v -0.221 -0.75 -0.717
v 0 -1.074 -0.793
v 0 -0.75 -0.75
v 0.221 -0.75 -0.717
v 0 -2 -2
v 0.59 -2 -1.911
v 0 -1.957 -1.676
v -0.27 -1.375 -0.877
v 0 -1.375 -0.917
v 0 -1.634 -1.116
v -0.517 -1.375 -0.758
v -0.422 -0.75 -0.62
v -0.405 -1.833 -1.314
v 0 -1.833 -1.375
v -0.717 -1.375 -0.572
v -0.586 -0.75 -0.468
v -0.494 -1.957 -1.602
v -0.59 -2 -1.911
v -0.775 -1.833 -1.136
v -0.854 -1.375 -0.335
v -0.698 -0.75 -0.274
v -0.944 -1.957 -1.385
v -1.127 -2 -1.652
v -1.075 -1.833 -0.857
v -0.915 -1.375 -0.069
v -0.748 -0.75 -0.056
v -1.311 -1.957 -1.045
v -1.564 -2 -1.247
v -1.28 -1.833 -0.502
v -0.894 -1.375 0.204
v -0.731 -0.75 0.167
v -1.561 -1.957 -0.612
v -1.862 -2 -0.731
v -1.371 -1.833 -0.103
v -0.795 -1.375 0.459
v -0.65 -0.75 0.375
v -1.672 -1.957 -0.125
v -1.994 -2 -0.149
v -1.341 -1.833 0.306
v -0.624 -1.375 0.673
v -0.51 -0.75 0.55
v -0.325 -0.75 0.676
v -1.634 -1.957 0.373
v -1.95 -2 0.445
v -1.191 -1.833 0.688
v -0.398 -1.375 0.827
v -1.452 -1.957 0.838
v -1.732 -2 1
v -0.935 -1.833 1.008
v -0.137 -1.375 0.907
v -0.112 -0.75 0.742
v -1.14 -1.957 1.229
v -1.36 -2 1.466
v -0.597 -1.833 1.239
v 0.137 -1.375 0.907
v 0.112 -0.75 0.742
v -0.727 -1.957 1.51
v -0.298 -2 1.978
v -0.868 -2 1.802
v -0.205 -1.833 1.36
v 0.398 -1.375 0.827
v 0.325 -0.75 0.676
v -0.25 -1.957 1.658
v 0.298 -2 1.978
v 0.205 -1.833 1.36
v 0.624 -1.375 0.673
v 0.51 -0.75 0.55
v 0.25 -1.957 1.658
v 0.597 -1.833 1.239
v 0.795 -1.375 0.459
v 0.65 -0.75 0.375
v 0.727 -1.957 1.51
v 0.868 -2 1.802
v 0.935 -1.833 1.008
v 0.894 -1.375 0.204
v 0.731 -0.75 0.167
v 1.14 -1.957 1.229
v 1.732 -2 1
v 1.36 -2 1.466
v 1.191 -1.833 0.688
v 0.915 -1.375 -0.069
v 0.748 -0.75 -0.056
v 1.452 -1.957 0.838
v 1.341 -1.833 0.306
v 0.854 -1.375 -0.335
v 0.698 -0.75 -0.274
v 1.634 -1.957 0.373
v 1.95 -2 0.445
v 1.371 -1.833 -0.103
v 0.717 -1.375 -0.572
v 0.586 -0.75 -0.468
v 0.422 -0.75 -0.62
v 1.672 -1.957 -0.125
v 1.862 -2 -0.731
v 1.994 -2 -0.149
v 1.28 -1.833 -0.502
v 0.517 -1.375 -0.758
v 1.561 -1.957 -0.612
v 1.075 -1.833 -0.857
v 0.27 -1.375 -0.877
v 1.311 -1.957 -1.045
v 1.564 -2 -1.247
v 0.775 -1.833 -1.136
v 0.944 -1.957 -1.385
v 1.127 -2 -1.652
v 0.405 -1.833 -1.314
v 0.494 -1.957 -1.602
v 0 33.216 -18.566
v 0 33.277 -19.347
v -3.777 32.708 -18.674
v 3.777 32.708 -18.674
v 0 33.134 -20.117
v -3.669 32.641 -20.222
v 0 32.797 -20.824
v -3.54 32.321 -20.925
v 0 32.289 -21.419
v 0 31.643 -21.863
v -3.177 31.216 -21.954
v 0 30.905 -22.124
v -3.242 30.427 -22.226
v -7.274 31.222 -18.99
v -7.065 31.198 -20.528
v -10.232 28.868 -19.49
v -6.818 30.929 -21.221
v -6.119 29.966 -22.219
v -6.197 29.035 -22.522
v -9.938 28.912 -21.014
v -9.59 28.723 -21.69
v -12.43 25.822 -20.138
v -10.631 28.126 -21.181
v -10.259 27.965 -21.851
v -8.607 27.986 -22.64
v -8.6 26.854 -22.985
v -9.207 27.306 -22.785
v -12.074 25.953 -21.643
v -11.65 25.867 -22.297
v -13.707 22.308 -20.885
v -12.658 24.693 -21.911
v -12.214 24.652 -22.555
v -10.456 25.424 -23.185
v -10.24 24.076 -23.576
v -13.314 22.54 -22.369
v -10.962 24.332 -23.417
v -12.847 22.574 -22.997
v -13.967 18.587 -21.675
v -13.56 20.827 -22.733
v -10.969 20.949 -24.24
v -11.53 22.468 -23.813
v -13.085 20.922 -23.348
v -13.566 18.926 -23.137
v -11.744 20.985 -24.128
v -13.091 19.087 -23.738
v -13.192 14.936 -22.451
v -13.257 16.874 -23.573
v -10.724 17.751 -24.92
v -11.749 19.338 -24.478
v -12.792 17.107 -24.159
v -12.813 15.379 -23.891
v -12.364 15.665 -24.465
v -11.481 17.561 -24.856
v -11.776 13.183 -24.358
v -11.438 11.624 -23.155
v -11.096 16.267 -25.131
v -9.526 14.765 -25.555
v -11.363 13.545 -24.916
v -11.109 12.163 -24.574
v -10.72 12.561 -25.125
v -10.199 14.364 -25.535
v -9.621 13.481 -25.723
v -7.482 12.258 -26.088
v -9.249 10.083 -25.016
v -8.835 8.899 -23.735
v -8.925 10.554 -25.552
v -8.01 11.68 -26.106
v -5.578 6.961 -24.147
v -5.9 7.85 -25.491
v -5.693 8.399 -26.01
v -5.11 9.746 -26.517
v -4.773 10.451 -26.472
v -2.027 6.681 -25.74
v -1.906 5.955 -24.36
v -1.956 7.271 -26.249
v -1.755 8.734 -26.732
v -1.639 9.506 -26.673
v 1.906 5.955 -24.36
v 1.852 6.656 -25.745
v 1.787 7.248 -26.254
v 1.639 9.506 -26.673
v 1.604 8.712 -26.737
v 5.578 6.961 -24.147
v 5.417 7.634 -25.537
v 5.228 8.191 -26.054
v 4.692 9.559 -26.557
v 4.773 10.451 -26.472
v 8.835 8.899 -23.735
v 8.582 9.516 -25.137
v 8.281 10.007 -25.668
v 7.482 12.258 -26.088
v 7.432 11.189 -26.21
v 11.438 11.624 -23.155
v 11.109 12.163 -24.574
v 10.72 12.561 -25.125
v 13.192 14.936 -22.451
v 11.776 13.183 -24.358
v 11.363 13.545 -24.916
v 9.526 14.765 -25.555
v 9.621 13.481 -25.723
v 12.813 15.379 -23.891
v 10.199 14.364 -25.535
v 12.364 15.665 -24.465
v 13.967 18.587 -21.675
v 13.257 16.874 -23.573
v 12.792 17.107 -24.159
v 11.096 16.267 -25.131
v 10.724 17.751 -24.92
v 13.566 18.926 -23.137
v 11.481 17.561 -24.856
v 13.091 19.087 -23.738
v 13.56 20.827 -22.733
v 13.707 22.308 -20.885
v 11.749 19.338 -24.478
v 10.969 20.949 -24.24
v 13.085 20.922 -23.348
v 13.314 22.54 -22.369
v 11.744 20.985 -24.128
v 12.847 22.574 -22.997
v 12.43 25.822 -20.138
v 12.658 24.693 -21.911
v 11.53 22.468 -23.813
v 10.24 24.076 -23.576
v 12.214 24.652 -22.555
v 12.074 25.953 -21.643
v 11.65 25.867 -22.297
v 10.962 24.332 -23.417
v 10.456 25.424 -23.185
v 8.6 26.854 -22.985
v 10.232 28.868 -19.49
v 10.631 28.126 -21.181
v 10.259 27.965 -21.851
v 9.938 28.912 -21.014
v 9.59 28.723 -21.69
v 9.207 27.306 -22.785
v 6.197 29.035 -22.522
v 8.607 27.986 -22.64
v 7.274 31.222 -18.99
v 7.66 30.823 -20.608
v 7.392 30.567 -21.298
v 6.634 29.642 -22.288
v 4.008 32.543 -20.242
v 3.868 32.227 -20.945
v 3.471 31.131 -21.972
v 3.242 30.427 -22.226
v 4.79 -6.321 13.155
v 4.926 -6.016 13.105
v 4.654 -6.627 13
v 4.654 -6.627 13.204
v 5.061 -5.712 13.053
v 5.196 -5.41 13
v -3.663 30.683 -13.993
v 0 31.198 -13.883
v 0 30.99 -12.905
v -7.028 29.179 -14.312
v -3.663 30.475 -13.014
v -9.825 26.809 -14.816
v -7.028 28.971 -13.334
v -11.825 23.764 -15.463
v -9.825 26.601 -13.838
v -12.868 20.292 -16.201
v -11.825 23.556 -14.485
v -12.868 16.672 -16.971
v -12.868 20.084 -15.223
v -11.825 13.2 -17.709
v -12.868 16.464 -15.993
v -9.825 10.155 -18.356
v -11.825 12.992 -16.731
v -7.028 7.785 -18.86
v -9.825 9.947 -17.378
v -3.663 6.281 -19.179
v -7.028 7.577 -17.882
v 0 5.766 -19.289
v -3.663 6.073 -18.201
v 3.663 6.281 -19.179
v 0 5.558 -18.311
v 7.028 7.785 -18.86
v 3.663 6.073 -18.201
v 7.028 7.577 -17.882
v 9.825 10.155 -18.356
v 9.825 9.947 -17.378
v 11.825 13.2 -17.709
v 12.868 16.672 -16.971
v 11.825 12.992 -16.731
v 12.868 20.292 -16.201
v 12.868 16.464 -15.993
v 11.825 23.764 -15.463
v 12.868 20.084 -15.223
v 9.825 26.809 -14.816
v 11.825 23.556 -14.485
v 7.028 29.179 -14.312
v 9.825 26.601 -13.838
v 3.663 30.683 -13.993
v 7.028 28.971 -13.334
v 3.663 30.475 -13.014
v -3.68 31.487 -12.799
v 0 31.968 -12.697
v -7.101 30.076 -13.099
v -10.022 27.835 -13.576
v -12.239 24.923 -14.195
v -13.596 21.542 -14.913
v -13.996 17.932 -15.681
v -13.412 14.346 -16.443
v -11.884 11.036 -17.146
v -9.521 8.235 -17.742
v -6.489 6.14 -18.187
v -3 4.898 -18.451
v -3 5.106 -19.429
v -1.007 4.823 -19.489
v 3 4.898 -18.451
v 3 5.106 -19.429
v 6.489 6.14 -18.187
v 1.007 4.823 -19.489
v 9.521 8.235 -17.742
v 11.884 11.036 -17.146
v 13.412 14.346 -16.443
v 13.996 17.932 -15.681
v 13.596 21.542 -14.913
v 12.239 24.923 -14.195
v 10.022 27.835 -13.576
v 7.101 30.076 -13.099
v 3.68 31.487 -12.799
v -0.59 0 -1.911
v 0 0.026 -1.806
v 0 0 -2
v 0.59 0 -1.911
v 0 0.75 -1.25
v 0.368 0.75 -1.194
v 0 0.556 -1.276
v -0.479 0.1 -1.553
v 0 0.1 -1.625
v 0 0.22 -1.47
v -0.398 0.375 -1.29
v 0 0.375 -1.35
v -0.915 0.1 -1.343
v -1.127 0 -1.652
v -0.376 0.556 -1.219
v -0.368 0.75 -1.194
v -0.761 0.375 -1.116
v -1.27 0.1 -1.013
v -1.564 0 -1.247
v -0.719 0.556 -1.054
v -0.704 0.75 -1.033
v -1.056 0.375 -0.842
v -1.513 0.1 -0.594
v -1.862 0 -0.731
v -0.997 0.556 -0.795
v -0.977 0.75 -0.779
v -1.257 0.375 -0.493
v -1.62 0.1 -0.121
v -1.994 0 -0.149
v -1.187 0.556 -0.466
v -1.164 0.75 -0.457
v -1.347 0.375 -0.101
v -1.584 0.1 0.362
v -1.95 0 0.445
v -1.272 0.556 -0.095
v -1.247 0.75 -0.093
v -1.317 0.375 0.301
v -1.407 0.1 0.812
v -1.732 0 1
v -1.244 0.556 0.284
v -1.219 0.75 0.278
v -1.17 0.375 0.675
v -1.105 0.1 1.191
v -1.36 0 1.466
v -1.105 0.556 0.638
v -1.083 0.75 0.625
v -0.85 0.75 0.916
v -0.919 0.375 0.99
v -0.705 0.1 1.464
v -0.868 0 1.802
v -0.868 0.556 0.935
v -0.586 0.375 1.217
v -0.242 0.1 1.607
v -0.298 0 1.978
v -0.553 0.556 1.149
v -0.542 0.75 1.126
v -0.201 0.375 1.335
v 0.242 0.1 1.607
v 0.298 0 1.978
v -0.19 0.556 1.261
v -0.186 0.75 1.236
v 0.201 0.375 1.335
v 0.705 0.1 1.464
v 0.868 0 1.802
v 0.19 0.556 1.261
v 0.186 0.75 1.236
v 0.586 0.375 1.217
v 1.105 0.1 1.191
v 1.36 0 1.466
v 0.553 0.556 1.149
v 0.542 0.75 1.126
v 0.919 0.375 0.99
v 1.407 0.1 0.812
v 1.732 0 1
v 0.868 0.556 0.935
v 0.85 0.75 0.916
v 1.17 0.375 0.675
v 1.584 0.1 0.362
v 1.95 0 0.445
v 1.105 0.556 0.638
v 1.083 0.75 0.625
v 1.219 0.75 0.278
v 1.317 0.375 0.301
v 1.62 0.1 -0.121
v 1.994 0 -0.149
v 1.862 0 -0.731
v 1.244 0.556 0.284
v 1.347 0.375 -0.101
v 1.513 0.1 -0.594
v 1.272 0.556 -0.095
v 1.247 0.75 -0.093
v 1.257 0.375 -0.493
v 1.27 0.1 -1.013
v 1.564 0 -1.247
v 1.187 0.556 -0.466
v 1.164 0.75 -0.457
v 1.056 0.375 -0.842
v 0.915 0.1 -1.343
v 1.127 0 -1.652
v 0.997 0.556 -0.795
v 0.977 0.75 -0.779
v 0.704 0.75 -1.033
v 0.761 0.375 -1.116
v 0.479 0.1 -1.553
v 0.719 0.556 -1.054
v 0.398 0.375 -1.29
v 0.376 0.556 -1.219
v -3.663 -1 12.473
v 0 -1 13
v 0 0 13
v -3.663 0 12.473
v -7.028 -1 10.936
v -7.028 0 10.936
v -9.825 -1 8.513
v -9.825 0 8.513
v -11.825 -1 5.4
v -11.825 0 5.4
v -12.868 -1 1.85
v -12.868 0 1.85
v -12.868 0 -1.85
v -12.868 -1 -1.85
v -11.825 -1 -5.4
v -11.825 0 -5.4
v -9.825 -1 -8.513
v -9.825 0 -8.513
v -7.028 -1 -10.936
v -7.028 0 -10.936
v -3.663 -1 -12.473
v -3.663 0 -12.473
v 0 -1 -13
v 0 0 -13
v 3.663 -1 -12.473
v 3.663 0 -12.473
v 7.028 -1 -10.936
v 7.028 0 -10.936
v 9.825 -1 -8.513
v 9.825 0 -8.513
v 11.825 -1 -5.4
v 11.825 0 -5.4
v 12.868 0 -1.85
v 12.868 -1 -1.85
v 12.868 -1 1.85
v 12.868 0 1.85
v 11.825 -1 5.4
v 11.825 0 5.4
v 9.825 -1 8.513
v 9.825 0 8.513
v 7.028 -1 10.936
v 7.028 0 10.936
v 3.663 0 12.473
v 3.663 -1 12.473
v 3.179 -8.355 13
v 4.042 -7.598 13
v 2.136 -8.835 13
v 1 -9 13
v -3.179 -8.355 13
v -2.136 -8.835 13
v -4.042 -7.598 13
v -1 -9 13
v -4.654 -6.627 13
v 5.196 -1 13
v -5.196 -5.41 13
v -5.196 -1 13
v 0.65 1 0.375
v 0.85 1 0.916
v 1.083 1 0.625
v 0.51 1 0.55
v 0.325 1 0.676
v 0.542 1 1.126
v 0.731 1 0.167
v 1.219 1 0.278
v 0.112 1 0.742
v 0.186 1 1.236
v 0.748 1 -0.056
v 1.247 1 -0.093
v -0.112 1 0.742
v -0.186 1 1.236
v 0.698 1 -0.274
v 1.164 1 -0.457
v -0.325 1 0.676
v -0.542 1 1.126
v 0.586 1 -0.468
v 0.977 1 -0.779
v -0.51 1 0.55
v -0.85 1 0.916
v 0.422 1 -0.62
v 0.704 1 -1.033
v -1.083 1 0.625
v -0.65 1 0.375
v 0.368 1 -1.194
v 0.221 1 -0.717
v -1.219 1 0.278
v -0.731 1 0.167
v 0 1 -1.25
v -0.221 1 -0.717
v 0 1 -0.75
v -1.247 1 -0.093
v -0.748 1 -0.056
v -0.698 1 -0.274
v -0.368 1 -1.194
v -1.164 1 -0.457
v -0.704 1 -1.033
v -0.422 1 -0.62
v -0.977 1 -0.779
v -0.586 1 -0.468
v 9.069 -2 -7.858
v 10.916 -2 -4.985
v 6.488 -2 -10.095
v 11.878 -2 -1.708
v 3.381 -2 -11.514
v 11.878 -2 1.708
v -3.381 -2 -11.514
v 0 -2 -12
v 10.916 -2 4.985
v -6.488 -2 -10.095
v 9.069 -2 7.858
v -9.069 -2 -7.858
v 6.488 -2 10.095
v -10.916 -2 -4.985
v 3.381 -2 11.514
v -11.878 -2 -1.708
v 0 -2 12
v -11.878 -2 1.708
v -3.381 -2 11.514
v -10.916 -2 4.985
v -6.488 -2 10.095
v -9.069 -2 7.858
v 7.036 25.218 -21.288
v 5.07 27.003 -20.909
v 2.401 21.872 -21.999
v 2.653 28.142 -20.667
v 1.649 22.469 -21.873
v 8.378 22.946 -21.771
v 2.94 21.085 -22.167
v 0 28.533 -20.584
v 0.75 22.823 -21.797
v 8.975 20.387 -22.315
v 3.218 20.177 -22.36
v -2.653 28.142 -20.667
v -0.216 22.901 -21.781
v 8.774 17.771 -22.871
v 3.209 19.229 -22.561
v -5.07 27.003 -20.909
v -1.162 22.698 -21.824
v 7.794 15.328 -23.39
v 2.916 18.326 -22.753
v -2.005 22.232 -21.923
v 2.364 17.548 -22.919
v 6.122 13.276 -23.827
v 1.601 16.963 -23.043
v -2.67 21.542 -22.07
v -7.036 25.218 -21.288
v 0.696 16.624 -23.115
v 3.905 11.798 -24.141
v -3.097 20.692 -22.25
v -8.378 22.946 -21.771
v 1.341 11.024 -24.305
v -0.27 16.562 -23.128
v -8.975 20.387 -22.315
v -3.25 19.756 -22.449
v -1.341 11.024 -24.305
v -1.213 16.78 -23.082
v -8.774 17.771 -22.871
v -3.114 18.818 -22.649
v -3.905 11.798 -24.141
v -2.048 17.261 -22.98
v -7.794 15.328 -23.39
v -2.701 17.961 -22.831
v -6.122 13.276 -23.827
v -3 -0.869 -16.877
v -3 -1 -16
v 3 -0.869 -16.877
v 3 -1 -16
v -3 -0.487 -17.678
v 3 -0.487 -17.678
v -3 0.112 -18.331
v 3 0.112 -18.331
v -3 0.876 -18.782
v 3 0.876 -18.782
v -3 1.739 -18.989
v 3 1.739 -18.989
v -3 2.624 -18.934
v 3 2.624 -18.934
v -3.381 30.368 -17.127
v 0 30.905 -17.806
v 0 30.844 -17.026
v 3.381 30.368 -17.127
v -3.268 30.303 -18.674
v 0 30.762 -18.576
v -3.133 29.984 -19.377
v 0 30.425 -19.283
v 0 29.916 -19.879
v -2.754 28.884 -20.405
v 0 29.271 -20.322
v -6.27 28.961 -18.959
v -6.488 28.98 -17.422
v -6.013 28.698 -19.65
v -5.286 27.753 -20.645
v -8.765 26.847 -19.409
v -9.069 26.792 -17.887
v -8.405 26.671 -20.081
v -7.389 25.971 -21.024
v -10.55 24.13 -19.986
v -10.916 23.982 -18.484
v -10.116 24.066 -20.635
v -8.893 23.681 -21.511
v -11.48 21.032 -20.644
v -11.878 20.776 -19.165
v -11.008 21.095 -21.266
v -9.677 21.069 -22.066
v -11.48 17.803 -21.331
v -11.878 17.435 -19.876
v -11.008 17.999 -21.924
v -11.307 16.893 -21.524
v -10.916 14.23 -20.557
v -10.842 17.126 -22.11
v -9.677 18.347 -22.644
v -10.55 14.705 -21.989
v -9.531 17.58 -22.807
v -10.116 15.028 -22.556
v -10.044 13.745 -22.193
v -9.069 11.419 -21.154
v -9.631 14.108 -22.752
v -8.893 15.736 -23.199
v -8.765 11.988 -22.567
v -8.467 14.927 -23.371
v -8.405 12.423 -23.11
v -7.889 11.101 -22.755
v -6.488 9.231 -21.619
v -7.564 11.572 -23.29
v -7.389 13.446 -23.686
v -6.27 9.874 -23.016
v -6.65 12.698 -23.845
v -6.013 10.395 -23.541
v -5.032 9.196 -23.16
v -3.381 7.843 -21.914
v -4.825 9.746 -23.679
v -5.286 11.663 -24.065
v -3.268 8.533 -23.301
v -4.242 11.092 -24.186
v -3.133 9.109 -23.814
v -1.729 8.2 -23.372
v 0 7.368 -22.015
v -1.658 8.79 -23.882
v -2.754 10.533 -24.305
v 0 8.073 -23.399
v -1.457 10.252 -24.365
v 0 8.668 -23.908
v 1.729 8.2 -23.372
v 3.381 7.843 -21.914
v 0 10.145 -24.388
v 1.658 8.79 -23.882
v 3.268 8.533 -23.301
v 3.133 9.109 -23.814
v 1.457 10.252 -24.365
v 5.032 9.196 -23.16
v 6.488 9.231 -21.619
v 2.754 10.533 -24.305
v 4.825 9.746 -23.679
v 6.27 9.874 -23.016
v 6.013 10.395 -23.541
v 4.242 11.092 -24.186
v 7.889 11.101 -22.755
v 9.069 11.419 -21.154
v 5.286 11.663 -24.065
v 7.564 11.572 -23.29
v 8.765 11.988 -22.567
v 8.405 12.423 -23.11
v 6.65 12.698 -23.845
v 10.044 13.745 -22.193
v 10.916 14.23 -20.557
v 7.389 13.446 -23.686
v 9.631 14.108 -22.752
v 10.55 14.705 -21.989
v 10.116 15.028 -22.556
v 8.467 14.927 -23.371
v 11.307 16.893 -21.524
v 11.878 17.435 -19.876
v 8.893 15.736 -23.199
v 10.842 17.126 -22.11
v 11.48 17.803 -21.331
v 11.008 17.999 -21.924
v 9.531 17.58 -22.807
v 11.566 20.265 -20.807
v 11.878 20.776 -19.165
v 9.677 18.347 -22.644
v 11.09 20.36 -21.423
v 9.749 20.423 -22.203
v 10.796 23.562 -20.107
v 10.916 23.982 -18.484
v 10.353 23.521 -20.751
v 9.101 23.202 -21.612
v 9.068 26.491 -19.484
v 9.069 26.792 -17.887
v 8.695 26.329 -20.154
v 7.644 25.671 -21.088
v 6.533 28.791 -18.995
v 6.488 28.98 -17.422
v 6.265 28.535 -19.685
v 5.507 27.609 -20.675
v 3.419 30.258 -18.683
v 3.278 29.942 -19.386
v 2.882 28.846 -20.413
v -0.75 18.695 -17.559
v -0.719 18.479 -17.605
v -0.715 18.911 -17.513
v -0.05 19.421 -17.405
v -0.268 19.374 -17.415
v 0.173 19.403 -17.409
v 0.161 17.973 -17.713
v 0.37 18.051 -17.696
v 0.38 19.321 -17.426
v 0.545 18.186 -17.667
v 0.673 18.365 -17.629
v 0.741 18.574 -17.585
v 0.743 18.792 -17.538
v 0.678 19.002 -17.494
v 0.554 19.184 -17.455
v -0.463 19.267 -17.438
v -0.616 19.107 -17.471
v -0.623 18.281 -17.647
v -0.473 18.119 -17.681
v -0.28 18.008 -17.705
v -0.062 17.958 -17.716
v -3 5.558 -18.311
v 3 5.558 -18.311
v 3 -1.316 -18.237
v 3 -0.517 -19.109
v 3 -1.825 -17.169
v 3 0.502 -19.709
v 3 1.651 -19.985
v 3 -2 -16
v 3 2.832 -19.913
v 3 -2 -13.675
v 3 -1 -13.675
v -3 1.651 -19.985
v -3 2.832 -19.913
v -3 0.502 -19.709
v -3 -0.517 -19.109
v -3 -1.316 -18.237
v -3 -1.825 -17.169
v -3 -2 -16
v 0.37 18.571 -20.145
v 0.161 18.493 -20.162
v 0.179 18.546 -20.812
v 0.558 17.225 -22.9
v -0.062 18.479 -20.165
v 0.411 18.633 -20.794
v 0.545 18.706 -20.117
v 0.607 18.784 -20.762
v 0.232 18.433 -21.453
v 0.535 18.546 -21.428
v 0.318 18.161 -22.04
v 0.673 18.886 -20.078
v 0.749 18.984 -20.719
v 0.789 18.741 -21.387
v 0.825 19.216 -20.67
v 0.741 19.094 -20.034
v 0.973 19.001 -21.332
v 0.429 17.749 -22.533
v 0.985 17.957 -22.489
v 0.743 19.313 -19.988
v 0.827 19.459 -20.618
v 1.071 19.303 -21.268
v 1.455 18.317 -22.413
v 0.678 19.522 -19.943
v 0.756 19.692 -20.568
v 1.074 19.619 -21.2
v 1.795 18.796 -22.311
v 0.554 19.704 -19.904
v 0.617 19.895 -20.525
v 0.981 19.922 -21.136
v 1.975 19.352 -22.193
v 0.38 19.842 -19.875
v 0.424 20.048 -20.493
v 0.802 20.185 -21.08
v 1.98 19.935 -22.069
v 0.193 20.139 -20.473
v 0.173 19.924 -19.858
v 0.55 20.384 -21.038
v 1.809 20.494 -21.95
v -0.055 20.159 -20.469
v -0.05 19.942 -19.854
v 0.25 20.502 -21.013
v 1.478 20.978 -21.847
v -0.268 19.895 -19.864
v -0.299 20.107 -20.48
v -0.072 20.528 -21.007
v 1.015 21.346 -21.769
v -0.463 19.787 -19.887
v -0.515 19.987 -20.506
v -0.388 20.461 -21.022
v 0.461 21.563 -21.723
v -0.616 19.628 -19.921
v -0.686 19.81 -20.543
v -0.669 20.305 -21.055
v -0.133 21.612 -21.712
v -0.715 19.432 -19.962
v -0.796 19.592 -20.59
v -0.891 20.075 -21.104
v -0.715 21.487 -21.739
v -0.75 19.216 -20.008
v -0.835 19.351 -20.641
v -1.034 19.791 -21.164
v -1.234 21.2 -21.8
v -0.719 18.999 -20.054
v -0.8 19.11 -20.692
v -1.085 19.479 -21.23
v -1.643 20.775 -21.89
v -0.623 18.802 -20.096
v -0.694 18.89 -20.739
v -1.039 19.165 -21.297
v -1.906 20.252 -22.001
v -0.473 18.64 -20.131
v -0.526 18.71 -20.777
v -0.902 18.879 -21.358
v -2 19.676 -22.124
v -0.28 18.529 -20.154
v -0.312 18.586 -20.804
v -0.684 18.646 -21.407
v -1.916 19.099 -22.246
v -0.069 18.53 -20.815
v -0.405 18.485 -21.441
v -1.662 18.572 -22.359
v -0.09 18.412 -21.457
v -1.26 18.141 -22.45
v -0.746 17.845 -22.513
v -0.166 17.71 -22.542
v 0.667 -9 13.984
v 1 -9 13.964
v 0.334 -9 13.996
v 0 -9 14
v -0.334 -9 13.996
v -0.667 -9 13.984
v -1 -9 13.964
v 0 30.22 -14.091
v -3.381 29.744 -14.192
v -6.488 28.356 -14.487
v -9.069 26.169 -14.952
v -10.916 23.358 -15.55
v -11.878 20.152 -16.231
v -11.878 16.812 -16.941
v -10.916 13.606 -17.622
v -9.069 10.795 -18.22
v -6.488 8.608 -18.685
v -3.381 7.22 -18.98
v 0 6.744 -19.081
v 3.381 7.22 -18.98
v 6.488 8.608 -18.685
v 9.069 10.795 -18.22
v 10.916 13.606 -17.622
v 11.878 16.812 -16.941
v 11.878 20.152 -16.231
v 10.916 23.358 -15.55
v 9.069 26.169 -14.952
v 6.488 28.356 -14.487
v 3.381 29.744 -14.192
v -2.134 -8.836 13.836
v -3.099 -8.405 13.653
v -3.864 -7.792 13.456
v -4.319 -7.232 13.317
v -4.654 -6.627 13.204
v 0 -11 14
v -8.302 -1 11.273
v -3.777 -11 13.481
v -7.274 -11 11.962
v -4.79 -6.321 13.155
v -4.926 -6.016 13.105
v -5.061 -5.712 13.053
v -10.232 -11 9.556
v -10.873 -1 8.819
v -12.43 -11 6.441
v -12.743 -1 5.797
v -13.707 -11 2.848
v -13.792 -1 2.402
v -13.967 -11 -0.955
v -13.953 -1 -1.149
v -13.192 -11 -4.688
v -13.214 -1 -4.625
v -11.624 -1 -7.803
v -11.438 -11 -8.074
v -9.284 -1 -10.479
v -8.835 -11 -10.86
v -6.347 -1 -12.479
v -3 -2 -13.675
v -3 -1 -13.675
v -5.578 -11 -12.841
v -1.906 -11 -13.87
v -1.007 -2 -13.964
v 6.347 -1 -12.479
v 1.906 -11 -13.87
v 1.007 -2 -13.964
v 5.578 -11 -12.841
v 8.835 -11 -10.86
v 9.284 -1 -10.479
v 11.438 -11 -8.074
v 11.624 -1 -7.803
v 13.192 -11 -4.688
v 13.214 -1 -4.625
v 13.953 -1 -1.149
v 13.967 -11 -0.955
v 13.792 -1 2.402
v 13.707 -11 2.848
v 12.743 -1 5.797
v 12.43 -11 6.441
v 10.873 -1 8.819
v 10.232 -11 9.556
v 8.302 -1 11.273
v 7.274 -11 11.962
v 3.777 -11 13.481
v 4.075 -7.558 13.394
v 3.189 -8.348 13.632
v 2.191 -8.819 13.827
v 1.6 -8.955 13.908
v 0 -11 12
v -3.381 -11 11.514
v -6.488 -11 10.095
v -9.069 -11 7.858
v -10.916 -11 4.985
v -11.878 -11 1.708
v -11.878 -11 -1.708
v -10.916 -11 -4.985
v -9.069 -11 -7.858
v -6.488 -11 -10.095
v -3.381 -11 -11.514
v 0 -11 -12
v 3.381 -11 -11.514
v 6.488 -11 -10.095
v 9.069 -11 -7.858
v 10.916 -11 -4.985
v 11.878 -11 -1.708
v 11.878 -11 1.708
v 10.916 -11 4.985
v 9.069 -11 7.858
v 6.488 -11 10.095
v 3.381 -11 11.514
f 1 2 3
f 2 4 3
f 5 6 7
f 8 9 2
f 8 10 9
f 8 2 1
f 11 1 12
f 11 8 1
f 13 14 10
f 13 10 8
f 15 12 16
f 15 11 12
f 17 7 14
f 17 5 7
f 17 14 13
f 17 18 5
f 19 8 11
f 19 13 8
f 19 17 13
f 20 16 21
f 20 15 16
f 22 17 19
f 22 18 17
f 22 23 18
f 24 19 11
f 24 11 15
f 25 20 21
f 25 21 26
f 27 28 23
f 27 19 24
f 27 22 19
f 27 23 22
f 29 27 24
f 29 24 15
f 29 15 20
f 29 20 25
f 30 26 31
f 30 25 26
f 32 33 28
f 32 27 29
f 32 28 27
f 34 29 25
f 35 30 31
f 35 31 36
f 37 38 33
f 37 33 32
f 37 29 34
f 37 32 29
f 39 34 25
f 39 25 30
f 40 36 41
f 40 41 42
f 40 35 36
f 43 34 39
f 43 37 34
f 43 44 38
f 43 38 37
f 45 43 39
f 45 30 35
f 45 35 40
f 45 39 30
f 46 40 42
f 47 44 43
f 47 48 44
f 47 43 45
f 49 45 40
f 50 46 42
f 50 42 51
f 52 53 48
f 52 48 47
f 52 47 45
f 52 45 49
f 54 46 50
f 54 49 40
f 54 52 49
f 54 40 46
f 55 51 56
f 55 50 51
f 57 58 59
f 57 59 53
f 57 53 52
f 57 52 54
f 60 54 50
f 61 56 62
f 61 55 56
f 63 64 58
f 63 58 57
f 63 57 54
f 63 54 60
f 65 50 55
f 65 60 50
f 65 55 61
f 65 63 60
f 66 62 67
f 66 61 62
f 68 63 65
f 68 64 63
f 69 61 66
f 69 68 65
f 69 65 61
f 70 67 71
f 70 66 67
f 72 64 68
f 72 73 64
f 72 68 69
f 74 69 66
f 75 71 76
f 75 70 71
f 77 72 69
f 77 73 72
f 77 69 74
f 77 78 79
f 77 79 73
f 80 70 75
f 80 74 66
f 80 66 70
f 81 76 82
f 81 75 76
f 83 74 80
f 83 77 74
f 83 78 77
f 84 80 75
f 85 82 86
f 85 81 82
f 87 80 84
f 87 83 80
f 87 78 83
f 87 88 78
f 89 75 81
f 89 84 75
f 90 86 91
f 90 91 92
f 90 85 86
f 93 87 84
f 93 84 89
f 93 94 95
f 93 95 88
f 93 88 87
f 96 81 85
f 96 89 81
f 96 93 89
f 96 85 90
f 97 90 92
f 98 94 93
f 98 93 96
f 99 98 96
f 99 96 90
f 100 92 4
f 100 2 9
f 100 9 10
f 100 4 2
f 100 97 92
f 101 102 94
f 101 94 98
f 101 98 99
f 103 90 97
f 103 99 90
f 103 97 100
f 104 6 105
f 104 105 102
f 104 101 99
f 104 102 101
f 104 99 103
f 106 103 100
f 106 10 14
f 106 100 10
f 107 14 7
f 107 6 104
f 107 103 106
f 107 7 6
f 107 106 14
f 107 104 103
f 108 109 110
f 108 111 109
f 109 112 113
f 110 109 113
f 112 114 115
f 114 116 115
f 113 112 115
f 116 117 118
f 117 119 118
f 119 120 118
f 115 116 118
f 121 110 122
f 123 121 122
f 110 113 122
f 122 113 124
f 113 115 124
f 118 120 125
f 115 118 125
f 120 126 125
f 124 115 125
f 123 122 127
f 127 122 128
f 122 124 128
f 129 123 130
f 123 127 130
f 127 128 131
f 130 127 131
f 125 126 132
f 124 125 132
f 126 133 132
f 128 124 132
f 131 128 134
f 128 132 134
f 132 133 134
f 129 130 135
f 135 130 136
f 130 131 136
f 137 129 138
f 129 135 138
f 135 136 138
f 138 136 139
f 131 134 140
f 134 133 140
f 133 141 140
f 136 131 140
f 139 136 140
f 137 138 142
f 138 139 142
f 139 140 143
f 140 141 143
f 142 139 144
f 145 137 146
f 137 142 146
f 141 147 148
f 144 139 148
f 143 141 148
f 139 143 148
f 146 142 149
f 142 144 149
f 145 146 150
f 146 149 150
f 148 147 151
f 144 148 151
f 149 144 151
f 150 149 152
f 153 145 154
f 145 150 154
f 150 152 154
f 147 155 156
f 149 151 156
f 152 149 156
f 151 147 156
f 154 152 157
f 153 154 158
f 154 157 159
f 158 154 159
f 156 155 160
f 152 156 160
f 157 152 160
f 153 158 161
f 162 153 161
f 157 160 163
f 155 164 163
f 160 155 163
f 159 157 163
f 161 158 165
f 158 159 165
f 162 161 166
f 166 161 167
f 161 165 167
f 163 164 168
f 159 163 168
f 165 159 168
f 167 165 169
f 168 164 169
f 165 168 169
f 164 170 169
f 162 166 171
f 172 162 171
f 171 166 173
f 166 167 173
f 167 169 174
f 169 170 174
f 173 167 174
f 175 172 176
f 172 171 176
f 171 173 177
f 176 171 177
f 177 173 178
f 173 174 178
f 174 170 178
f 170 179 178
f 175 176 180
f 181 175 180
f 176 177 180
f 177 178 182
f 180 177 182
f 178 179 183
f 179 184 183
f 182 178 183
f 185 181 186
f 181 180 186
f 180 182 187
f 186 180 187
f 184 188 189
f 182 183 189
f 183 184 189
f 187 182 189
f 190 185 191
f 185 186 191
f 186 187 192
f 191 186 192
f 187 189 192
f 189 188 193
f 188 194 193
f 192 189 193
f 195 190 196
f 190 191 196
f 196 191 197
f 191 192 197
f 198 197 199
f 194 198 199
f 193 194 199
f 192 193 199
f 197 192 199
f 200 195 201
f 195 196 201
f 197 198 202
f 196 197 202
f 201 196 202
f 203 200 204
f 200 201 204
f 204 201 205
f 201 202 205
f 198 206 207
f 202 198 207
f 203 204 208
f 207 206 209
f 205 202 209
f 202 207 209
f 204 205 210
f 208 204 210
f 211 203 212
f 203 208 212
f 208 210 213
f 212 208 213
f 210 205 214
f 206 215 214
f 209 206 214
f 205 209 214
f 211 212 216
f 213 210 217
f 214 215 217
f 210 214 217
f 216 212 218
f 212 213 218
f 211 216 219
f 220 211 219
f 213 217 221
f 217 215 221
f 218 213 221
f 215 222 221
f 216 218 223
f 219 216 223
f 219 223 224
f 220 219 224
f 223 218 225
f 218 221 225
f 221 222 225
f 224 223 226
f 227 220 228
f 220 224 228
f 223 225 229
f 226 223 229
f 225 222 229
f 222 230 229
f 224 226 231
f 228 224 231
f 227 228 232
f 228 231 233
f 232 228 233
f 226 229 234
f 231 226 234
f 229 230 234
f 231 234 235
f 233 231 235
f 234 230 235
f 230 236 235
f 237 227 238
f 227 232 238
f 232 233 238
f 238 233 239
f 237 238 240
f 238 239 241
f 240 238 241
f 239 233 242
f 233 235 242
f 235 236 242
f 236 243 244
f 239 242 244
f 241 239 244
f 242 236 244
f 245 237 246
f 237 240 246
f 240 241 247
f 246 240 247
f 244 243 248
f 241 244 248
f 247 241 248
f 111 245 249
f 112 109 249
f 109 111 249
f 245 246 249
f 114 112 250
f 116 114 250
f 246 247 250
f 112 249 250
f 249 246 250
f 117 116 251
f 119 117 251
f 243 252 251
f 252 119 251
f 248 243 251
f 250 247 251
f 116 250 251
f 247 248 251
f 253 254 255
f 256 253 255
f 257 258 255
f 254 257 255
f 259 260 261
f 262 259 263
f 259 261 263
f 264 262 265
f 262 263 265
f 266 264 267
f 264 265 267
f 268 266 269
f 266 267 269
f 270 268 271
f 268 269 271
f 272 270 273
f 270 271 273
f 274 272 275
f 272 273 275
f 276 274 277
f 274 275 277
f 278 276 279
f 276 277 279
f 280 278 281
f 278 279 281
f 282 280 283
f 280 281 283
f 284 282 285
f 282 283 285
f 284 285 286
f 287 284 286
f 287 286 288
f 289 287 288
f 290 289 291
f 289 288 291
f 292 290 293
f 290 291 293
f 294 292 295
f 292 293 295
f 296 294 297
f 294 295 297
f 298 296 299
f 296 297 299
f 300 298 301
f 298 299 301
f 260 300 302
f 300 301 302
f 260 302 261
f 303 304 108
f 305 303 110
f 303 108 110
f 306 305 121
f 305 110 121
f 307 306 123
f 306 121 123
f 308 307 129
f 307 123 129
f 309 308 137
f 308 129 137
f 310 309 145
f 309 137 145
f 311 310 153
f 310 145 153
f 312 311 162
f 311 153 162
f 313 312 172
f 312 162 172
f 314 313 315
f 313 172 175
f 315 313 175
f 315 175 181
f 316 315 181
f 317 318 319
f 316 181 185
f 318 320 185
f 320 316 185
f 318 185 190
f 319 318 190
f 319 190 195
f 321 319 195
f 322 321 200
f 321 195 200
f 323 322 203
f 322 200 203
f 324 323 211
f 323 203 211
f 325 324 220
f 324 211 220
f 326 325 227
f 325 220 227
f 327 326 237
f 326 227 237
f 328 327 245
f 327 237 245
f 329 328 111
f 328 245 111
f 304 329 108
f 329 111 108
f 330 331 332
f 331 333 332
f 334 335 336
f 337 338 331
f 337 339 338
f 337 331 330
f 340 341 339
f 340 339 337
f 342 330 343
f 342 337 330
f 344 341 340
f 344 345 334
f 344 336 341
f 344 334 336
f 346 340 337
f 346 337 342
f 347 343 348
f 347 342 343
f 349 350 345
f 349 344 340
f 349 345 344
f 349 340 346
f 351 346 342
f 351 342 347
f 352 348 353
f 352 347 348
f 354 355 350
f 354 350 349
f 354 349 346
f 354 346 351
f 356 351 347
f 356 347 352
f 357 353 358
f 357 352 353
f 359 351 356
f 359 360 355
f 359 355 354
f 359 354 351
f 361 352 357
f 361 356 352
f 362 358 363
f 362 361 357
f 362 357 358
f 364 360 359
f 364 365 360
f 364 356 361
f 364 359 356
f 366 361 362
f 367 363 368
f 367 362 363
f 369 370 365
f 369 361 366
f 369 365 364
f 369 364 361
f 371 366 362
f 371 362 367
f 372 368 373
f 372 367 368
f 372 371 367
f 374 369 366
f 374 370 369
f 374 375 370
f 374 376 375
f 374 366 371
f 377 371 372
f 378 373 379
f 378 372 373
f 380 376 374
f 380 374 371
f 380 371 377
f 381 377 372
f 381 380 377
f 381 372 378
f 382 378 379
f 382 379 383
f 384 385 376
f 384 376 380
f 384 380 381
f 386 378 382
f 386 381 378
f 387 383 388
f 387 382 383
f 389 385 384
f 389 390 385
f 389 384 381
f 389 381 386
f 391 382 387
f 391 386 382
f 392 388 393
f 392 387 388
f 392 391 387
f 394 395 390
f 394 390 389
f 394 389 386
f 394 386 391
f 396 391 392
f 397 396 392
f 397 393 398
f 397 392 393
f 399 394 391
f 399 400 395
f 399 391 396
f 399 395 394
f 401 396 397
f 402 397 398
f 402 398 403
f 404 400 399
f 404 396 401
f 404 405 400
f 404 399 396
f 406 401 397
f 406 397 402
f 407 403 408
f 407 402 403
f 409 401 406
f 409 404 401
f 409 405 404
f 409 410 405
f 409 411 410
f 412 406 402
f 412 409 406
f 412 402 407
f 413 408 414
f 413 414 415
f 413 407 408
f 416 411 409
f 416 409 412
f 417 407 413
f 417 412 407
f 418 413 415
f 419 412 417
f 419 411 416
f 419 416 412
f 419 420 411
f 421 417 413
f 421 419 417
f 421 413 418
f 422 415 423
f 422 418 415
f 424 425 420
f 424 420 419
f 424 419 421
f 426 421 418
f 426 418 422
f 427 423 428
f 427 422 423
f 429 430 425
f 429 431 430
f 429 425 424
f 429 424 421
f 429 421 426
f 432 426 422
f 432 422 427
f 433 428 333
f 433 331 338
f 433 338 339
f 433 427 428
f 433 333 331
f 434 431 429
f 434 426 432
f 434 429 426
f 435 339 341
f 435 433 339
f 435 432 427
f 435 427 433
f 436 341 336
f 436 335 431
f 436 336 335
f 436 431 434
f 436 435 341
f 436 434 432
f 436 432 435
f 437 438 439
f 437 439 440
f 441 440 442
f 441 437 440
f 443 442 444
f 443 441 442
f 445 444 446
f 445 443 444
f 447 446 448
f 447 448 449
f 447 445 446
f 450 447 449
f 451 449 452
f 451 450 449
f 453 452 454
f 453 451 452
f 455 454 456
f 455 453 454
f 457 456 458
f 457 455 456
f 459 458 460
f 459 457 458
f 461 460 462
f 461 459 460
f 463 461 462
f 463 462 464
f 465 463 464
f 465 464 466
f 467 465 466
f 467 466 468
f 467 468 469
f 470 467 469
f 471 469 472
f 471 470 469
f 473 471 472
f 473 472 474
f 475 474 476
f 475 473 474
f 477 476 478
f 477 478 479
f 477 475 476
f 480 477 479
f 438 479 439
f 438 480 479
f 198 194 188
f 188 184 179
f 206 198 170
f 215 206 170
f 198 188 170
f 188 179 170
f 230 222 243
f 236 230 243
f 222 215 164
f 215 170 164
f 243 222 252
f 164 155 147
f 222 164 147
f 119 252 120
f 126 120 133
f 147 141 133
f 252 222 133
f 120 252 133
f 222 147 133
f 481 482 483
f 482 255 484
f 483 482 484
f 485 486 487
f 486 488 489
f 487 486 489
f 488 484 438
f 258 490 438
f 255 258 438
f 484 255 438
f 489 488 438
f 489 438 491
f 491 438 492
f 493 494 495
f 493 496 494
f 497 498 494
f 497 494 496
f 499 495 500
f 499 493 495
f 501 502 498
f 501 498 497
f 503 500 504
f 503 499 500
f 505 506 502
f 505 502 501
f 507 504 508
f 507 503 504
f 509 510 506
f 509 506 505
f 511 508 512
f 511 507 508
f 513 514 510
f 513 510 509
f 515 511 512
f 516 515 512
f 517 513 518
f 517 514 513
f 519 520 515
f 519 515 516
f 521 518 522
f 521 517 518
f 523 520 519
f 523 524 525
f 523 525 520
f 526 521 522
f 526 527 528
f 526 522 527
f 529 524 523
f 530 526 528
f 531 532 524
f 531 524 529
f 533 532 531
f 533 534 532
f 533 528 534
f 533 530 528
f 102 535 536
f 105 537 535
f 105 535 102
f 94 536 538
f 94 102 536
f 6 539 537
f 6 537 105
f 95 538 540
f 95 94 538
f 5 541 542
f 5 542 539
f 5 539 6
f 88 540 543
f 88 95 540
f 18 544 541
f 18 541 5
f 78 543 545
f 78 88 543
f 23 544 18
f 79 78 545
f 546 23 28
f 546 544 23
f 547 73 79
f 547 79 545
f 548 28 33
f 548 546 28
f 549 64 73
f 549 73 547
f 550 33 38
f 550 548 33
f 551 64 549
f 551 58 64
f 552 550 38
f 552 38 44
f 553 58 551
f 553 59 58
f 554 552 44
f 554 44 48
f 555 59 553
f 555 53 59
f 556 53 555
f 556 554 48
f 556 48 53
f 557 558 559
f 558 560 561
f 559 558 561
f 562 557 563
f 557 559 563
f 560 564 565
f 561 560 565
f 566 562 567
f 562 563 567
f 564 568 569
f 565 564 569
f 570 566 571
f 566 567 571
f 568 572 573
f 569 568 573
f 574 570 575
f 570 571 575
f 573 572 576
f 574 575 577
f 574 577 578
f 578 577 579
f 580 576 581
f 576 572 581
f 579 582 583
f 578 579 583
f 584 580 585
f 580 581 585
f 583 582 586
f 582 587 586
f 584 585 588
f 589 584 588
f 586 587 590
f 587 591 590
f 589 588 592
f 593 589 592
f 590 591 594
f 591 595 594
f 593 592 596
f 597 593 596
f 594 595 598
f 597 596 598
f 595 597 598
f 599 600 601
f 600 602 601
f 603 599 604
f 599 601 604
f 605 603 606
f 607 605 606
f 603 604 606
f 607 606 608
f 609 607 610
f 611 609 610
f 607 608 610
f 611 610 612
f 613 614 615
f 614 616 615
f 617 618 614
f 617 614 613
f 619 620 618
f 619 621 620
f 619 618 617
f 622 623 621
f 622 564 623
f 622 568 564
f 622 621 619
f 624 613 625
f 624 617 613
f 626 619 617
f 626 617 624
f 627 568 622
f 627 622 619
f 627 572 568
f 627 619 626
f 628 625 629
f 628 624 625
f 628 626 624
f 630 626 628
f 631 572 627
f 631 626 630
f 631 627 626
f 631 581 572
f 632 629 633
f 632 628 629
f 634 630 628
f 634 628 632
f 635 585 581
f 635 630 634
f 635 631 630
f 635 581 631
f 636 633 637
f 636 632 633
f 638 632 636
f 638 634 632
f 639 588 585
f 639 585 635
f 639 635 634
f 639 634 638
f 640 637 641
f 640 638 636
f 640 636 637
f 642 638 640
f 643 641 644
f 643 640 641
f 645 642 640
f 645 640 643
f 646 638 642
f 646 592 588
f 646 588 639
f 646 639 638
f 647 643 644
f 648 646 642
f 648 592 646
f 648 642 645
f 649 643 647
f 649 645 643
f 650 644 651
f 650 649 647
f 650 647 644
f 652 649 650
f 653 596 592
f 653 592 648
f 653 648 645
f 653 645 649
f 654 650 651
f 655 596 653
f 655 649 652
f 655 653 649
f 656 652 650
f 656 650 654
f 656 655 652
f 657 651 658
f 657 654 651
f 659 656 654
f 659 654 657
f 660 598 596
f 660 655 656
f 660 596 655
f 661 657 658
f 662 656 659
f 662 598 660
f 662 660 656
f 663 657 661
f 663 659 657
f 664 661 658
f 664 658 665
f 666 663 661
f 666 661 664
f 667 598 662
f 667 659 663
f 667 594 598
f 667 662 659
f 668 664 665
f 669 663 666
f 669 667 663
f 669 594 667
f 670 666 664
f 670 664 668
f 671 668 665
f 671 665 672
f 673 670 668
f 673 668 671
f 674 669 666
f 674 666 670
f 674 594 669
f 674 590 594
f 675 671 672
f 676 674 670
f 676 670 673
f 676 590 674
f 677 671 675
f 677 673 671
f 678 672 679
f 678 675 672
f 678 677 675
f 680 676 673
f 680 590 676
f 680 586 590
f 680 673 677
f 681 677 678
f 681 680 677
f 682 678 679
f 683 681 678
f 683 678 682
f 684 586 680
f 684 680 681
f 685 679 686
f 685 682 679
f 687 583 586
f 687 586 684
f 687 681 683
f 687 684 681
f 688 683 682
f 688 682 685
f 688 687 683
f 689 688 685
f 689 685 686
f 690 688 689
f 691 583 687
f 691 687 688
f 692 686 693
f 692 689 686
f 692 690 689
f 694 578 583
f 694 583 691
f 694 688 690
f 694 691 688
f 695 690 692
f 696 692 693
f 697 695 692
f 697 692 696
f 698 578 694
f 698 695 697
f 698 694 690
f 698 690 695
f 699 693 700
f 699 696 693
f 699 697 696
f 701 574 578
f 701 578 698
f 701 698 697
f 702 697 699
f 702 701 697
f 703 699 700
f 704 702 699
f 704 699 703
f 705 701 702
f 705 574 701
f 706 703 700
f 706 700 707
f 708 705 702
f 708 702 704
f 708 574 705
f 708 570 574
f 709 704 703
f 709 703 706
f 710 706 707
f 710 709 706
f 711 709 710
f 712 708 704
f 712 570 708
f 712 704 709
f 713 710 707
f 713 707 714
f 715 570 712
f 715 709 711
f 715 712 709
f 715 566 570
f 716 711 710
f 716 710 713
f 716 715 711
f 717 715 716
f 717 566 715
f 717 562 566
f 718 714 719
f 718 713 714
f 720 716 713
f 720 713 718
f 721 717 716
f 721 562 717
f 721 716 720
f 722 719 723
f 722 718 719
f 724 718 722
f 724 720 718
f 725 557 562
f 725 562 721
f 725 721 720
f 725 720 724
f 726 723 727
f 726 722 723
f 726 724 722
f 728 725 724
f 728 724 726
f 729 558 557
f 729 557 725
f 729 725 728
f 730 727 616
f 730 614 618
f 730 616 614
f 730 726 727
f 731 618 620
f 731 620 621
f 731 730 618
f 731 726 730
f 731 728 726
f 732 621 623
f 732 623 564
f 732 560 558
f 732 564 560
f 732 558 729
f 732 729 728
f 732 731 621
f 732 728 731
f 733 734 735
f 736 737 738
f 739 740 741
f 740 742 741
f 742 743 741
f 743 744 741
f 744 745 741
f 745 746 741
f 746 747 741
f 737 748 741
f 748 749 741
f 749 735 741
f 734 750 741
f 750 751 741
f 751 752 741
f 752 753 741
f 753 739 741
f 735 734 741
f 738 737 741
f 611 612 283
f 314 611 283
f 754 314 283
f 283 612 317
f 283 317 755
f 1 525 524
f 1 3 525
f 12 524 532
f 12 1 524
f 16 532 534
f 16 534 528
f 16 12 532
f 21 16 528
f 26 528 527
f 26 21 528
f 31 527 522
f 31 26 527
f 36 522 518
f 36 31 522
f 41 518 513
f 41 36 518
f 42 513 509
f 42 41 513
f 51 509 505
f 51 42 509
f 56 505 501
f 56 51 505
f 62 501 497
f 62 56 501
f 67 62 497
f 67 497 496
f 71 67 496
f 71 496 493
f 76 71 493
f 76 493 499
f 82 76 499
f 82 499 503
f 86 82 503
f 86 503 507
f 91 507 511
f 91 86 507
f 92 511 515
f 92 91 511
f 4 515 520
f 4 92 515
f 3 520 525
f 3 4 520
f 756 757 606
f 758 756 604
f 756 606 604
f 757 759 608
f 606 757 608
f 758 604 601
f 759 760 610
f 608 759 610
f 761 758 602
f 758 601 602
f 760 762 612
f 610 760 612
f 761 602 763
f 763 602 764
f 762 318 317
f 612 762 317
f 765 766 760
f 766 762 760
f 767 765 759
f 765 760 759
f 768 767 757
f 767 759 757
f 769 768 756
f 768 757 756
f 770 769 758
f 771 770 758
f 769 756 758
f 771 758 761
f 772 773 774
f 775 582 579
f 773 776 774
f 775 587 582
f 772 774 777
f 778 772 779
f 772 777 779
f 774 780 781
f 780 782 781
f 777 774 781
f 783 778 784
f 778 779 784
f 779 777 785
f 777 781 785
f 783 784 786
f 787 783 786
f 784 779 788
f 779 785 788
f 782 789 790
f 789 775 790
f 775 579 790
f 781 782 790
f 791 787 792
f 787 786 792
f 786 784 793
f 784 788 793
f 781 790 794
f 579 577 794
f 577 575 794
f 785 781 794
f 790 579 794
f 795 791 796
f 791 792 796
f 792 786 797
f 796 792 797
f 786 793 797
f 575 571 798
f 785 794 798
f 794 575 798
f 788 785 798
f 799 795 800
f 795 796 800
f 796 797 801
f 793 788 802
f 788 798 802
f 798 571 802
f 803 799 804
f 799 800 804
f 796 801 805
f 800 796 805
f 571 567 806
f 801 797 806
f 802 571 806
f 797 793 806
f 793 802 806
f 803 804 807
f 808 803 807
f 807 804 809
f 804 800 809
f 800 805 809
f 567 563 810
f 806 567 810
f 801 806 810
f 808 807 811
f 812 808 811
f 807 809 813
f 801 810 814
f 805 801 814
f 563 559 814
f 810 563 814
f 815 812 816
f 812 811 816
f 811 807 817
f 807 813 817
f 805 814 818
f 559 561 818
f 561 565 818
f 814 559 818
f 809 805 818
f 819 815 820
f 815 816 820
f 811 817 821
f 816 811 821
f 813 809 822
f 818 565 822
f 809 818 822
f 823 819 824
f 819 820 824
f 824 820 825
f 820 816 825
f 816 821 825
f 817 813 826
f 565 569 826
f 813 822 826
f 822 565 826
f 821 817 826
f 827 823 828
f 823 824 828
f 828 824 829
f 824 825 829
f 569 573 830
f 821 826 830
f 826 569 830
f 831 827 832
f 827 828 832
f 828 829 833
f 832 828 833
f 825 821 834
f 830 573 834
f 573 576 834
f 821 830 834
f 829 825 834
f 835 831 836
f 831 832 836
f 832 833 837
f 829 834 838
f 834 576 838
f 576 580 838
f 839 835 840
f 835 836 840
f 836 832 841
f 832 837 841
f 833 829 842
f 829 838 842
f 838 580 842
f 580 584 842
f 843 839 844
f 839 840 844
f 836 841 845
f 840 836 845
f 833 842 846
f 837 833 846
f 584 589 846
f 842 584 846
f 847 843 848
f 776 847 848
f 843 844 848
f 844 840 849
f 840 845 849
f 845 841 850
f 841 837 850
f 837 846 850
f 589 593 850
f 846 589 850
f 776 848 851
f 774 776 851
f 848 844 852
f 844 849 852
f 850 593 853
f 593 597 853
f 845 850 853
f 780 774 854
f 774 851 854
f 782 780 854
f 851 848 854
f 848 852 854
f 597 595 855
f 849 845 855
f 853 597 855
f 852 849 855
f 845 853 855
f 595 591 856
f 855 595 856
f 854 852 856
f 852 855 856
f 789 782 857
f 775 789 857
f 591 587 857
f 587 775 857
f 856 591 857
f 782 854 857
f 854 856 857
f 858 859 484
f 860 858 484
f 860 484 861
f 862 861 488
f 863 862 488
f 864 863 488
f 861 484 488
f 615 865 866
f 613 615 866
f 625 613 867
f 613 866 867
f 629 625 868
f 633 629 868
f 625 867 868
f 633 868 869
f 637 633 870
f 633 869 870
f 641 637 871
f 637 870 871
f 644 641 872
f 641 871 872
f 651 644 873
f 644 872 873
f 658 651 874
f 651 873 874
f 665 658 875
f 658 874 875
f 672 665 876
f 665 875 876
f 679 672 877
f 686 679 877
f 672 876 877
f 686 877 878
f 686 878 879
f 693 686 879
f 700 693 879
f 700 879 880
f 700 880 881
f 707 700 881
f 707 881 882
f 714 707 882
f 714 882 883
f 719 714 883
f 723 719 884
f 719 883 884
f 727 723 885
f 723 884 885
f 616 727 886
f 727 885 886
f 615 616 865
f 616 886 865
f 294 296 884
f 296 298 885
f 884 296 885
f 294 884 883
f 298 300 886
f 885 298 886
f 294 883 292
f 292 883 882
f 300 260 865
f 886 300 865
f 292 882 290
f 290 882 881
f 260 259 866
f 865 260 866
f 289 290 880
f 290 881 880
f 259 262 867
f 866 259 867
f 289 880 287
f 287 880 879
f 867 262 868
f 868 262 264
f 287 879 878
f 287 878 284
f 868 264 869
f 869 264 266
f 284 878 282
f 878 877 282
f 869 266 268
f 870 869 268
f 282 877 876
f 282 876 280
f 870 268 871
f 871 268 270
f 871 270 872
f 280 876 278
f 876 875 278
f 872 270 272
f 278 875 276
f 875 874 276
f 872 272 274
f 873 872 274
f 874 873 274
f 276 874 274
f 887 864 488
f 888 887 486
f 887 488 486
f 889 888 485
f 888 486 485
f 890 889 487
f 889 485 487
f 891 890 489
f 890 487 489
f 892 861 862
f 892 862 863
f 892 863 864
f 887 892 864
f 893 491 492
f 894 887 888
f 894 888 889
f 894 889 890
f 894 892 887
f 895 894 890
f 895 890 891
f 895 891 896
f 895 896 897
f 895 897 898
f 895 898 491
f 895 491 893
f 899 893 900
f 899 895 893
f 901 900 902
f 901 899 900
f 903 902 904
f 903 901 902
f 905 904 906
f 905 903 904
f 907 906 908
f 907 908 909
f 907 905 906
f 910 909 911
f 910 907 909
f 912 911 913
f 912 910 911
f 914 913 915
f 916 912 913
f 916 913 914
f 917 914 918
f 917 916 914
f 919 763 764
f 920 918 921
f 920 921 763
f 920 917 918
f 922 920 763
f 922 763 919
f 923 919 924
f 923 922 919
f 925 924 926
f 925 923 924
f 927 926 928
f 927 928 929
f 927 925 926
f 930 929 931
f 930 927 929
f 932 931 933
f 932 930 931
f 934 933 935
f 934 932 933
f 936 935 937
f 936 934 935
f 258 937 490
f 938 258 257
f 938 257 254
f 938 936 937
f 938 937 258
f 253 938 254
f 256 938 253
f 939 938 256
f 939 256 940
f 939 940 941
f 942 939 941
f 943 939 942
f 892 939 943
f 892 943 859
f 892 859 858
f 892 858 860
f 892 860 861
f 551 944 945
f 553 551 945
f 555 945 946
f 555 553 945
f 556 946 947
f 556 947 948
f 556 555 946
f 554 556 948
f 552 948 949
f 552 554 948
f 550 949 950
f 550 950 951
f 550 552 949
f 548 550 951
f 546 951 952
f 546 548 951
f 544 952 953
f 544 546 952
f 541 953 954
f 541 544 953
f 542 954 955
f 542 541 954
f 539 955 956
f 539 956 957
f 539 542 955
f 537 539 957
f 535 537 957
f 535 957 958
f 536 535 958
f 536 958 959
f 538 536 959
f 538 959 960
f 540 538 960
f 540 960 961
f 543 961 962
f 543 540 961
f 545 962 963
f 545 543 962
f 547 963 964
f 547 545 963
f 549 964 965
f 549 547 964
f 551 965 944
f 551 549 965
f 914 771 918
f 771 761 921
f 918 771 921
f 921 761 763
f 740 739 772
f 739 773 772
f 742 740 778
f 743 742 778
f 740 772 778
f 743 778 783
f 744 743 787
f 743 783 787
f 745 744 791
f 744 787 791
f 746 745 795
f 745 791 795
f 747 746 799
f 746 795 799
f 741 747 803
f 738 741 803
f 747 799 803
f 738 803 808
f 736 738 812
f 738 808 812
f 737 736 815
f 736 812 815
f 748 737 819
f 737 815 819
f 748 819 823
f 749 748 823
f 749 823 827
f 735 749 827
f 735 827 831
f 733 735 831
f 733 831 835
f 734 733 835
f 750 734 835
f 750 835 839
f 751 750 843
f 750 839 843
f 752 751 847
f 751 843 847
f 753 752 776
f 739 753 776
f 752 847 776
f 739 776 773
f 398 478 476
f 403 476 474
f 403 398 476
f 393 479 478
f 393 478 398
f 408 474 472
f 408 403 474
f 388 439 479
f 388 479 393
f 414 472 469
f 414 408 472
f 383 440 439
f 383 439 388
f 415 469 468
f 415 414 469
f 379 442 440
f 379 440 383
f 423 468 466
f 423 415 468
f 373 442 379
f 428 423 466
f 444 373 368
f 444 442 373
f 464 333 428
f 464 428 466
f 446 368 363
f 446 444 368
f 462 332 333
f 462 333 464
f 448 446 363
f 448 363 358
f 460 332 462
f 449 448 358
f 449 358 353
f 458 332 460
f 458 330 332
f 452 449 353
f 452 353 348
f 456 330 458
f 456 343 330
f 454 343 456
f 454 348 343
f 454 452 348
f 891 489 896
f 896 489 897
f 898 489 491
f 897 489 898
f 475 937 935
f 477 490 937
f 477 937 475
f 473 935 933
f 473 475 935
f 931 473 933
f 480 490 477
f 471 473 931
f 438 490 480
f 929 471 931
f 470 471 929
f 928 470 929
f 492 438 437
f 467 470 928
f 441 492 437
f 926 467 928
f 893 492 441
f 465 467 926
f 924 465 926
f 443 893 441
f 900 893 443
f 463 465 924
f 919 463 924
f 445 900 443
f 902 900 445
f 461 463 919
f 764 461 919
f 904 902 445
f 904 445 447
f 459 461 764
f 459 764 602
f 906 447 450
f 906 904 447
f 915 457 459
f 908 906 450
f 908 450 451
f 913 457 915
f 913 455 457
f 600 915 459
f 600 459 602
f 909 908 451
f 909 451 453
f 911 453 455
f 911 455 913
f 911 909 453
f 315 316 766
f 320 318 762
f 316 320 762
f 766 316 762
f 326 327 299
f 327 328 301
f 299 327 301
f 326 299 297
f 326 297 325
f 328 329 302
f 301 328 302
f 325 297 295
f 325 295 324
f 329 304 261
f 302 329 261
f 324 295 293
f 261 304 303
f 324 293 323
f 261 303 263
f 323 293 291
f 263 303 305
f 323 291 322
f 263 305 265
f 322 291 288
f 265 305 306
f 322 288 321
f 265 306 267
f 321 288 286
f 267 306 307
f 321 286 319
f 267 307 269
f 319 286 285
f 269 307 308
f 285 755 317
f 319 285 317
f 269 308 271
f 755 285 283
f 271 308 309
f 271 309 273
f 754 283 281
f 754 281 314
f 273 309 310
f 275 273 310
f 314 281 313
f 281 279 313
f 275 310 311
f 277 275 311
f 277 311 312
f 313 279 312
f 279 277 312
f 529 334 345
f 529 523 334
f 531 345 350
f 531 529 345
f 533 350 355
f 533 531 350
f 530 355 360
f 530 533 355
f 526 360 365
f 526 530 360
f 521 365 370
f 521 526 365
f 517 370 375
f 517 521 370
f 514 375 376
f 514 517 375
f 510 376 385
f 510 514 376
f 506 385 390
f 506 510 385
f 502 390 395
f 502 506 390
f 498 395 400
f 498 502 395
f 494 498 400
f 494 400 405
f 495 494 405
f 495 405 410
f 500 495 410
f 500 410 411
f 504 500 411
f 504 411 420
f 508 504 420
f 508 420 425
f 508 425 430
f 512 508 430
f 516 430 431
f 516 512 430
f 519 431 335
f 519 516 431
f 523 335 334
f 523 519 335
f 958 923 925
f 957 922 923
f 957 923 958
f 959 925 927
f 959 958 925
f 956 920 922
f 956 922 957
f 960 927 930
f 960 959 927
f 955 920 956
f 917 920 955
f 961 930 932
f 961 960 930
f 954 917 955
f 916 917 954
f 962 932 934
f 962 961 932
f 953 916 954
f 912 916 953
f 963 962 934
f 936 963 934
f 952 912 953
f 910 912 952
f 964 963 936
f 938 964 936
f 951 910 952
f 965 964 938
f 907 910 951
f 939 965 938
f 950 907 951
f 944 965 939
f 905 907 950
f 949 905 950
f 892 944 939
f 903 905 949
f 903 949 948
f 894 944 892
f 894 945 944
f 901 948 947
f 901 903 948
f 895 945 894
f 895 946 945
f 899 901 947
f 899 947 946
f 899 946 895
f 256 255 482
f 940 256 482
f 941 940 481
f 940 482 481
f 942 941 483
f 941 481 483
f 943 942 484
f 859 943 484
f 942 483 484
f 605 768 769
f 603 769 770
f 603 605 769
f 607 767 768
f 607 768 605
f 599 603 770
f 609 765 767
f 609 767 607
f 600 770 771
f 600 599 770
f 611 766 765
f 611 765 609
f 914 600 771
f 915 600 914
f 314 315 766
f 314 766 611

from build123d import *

# Parameters (mm, degrees)
CUT_EXTRUDE1_DEPTH  = 8.5
BOSS_EXTRUDE1_DEPTH = 3
FILLET1_R           = 3


with BuildPart() as part:
    # Sketch1 → Revolve1 (revolve)
    with BuildSketch(Plane(origin=(0, 0, 0), x_dir=(0, 0, -1), z_dir=(1, 0, 0))):
        Polygon((-2, 0), (-13, 0), (-13, -1), (-14, -1), (-14, -11), (-12, -11), (-12, -2), (-2, -2), align=None)
    revolve(axis=Axis((0, 0, 0), (0, -1, 0)))

    # Sketch3 → Cut-Extrude1 (cut)
    with BuildSketch(Plane.XY.offset(13)):
        with BuildLine():
            Line((1, -9), (-1, -9))
            ThreePointArc((-1, -9), (-3.17855614, -8.354682272), (-4.654181831, -6.626946572))
            Line((-4.654181831, -6.626946572), (-7.159459855, -1))
            Line((-7.159459855, -1), (7.159459855, -1))
            Line((7.159459855, -1), (4.654181831, -6.626946572))
            ThreePointArc((4.654181831, -6.626946572), (3.17855614, -8.354682272), (1, -9))
        make_face()
    extrude(amount=CUT_EXTRUDE1_DEPTH, mode=Mode.SUBTRACT)

    # Sketch4 → Boss-Extrude1 (add, symmetric)
    with BuildSketch(Plane(origin=(0, 0, 0), x_dir=(0, 0, -1), z_dir=(1, 0, 0))):
        with BuildLine():
            Line((13, -1), (16, -1))
            ThreePointArc((16, -1), (18.331437884, 0.112038827), (18.934442802, 2.623735072))
            Line((18.934442802, 2.623735072), (18.31070773, 5.558177875))
            Line((18.31070773, 5.558177875), (19.28885533, 5.766089565))
            Line((19.28885533, 5.766089565), (19.912590403, 2.831646763))
            ThreePointArc((19.912590403, 2.831646763), (19.108583846, -0.517281564), (16, -2))
            Line((16, -2), (13, -2))
            Line((13, -2), (13, -1))
        make_face()
    extrude(amount=BOSS_EXTRUDE1_DEPTH, both=True)

    # Sketch5 → Revolve2 (revolve)
    with BuildSketch(Plane(origin=(0, 0, 0), x_dir=(0, 0, -1), z_dir=(1, 0, 0)), mode=Mode.PRIVATE) as revolve2_sk:
        Polygon((18.518619421, 4.580030274), (27.321947827, 6.451235491), (24.411184156, 20.145301902), (22.454888954, 19.72947852), (24.949829244, 7.991707311), (19.08094364, 6.744237166), (19.28885533, 5.766089565), (18.31070773, 5.558177875), align=None)
    revolve(revolve2_sk.sketch.rotate(Axis((0, 20.145301902, -24.411184156), (0, -0.20791169081776387, 0.9781476007338047)), 180), axis=Axis((0, 20.145301902, -24.411184156), (0, -0.20791169081776387, 0.9781476007338047)))

    # Fillet1
    fillet1_edges = [part.edges().sort_by_distance(p)[0] for p in [
        (0, 6.451235491, -27.321947827),
        (0, 7.991707311, -24.949829244),
    ]]
    fillet(fillet1_edges, radius=FILLET1_R)

    # Sketch6 → Revolve3 (revolve)
    with BuildSketch(Plane(origin=(0, 0, 0), x_dir=(0, 0, -1), z_dir=(1, 0, 0))):
        with BuildLine():
            Line((0.75, 1), (0.75, -0.75))
            ThreePointArc((0.75, -0.75), (1.116116524, -1.633883476), (2, -2))
            Line((2, -2), (2, 0))
            ThreePointArc((2, 0), (1.469669914, 0.219669914), (1.25, 0.75))
            Line((1.25, 0.75), (1.25, 1))
            Line((1.25, 1), (0.75, 1))
        make_face()
    revolve(axis=Axis((0, 0, 0), (0, 1, 0)))

    # Sketch7 → Revolve4 (revolve)
    with BuildSketch(Plane(origin=(0, 0, 0), x_dir=(0, 0, -1), z_dir=(1, 0, 0)), mode=Mode.PRIVATE) as revolve4_sk:
        with BuildLine():
            Line((22.454888954, 19.72947852), (17.560305242, 18.689102635))
            Line((17.560305242, 18.689102635), (17.404371474, 19.422713336))
            Line((17.404371474, 19.422713336), (19.853586184, 19.943309993))
            ThreePointArc((19.853586184, 19.943309993), (21.430483377, 21.027081408), (21.779175959, 22.908458222))
            Line((21.779175959, 22.908458222), (22.454888954, 19.72947852))
        make_face()
    revolve(revolve4_sk.sketch.rotate(Axis((0, 19.72947852, -22.454888954), (0, -0.20791169081776406, 0.9781476007338047)), 192.373625116), axis=Axis((0, 19.72947852, -22.454888954), (0, -0.20791169081776406, 0.9781476007338047)))


solid = part.part
